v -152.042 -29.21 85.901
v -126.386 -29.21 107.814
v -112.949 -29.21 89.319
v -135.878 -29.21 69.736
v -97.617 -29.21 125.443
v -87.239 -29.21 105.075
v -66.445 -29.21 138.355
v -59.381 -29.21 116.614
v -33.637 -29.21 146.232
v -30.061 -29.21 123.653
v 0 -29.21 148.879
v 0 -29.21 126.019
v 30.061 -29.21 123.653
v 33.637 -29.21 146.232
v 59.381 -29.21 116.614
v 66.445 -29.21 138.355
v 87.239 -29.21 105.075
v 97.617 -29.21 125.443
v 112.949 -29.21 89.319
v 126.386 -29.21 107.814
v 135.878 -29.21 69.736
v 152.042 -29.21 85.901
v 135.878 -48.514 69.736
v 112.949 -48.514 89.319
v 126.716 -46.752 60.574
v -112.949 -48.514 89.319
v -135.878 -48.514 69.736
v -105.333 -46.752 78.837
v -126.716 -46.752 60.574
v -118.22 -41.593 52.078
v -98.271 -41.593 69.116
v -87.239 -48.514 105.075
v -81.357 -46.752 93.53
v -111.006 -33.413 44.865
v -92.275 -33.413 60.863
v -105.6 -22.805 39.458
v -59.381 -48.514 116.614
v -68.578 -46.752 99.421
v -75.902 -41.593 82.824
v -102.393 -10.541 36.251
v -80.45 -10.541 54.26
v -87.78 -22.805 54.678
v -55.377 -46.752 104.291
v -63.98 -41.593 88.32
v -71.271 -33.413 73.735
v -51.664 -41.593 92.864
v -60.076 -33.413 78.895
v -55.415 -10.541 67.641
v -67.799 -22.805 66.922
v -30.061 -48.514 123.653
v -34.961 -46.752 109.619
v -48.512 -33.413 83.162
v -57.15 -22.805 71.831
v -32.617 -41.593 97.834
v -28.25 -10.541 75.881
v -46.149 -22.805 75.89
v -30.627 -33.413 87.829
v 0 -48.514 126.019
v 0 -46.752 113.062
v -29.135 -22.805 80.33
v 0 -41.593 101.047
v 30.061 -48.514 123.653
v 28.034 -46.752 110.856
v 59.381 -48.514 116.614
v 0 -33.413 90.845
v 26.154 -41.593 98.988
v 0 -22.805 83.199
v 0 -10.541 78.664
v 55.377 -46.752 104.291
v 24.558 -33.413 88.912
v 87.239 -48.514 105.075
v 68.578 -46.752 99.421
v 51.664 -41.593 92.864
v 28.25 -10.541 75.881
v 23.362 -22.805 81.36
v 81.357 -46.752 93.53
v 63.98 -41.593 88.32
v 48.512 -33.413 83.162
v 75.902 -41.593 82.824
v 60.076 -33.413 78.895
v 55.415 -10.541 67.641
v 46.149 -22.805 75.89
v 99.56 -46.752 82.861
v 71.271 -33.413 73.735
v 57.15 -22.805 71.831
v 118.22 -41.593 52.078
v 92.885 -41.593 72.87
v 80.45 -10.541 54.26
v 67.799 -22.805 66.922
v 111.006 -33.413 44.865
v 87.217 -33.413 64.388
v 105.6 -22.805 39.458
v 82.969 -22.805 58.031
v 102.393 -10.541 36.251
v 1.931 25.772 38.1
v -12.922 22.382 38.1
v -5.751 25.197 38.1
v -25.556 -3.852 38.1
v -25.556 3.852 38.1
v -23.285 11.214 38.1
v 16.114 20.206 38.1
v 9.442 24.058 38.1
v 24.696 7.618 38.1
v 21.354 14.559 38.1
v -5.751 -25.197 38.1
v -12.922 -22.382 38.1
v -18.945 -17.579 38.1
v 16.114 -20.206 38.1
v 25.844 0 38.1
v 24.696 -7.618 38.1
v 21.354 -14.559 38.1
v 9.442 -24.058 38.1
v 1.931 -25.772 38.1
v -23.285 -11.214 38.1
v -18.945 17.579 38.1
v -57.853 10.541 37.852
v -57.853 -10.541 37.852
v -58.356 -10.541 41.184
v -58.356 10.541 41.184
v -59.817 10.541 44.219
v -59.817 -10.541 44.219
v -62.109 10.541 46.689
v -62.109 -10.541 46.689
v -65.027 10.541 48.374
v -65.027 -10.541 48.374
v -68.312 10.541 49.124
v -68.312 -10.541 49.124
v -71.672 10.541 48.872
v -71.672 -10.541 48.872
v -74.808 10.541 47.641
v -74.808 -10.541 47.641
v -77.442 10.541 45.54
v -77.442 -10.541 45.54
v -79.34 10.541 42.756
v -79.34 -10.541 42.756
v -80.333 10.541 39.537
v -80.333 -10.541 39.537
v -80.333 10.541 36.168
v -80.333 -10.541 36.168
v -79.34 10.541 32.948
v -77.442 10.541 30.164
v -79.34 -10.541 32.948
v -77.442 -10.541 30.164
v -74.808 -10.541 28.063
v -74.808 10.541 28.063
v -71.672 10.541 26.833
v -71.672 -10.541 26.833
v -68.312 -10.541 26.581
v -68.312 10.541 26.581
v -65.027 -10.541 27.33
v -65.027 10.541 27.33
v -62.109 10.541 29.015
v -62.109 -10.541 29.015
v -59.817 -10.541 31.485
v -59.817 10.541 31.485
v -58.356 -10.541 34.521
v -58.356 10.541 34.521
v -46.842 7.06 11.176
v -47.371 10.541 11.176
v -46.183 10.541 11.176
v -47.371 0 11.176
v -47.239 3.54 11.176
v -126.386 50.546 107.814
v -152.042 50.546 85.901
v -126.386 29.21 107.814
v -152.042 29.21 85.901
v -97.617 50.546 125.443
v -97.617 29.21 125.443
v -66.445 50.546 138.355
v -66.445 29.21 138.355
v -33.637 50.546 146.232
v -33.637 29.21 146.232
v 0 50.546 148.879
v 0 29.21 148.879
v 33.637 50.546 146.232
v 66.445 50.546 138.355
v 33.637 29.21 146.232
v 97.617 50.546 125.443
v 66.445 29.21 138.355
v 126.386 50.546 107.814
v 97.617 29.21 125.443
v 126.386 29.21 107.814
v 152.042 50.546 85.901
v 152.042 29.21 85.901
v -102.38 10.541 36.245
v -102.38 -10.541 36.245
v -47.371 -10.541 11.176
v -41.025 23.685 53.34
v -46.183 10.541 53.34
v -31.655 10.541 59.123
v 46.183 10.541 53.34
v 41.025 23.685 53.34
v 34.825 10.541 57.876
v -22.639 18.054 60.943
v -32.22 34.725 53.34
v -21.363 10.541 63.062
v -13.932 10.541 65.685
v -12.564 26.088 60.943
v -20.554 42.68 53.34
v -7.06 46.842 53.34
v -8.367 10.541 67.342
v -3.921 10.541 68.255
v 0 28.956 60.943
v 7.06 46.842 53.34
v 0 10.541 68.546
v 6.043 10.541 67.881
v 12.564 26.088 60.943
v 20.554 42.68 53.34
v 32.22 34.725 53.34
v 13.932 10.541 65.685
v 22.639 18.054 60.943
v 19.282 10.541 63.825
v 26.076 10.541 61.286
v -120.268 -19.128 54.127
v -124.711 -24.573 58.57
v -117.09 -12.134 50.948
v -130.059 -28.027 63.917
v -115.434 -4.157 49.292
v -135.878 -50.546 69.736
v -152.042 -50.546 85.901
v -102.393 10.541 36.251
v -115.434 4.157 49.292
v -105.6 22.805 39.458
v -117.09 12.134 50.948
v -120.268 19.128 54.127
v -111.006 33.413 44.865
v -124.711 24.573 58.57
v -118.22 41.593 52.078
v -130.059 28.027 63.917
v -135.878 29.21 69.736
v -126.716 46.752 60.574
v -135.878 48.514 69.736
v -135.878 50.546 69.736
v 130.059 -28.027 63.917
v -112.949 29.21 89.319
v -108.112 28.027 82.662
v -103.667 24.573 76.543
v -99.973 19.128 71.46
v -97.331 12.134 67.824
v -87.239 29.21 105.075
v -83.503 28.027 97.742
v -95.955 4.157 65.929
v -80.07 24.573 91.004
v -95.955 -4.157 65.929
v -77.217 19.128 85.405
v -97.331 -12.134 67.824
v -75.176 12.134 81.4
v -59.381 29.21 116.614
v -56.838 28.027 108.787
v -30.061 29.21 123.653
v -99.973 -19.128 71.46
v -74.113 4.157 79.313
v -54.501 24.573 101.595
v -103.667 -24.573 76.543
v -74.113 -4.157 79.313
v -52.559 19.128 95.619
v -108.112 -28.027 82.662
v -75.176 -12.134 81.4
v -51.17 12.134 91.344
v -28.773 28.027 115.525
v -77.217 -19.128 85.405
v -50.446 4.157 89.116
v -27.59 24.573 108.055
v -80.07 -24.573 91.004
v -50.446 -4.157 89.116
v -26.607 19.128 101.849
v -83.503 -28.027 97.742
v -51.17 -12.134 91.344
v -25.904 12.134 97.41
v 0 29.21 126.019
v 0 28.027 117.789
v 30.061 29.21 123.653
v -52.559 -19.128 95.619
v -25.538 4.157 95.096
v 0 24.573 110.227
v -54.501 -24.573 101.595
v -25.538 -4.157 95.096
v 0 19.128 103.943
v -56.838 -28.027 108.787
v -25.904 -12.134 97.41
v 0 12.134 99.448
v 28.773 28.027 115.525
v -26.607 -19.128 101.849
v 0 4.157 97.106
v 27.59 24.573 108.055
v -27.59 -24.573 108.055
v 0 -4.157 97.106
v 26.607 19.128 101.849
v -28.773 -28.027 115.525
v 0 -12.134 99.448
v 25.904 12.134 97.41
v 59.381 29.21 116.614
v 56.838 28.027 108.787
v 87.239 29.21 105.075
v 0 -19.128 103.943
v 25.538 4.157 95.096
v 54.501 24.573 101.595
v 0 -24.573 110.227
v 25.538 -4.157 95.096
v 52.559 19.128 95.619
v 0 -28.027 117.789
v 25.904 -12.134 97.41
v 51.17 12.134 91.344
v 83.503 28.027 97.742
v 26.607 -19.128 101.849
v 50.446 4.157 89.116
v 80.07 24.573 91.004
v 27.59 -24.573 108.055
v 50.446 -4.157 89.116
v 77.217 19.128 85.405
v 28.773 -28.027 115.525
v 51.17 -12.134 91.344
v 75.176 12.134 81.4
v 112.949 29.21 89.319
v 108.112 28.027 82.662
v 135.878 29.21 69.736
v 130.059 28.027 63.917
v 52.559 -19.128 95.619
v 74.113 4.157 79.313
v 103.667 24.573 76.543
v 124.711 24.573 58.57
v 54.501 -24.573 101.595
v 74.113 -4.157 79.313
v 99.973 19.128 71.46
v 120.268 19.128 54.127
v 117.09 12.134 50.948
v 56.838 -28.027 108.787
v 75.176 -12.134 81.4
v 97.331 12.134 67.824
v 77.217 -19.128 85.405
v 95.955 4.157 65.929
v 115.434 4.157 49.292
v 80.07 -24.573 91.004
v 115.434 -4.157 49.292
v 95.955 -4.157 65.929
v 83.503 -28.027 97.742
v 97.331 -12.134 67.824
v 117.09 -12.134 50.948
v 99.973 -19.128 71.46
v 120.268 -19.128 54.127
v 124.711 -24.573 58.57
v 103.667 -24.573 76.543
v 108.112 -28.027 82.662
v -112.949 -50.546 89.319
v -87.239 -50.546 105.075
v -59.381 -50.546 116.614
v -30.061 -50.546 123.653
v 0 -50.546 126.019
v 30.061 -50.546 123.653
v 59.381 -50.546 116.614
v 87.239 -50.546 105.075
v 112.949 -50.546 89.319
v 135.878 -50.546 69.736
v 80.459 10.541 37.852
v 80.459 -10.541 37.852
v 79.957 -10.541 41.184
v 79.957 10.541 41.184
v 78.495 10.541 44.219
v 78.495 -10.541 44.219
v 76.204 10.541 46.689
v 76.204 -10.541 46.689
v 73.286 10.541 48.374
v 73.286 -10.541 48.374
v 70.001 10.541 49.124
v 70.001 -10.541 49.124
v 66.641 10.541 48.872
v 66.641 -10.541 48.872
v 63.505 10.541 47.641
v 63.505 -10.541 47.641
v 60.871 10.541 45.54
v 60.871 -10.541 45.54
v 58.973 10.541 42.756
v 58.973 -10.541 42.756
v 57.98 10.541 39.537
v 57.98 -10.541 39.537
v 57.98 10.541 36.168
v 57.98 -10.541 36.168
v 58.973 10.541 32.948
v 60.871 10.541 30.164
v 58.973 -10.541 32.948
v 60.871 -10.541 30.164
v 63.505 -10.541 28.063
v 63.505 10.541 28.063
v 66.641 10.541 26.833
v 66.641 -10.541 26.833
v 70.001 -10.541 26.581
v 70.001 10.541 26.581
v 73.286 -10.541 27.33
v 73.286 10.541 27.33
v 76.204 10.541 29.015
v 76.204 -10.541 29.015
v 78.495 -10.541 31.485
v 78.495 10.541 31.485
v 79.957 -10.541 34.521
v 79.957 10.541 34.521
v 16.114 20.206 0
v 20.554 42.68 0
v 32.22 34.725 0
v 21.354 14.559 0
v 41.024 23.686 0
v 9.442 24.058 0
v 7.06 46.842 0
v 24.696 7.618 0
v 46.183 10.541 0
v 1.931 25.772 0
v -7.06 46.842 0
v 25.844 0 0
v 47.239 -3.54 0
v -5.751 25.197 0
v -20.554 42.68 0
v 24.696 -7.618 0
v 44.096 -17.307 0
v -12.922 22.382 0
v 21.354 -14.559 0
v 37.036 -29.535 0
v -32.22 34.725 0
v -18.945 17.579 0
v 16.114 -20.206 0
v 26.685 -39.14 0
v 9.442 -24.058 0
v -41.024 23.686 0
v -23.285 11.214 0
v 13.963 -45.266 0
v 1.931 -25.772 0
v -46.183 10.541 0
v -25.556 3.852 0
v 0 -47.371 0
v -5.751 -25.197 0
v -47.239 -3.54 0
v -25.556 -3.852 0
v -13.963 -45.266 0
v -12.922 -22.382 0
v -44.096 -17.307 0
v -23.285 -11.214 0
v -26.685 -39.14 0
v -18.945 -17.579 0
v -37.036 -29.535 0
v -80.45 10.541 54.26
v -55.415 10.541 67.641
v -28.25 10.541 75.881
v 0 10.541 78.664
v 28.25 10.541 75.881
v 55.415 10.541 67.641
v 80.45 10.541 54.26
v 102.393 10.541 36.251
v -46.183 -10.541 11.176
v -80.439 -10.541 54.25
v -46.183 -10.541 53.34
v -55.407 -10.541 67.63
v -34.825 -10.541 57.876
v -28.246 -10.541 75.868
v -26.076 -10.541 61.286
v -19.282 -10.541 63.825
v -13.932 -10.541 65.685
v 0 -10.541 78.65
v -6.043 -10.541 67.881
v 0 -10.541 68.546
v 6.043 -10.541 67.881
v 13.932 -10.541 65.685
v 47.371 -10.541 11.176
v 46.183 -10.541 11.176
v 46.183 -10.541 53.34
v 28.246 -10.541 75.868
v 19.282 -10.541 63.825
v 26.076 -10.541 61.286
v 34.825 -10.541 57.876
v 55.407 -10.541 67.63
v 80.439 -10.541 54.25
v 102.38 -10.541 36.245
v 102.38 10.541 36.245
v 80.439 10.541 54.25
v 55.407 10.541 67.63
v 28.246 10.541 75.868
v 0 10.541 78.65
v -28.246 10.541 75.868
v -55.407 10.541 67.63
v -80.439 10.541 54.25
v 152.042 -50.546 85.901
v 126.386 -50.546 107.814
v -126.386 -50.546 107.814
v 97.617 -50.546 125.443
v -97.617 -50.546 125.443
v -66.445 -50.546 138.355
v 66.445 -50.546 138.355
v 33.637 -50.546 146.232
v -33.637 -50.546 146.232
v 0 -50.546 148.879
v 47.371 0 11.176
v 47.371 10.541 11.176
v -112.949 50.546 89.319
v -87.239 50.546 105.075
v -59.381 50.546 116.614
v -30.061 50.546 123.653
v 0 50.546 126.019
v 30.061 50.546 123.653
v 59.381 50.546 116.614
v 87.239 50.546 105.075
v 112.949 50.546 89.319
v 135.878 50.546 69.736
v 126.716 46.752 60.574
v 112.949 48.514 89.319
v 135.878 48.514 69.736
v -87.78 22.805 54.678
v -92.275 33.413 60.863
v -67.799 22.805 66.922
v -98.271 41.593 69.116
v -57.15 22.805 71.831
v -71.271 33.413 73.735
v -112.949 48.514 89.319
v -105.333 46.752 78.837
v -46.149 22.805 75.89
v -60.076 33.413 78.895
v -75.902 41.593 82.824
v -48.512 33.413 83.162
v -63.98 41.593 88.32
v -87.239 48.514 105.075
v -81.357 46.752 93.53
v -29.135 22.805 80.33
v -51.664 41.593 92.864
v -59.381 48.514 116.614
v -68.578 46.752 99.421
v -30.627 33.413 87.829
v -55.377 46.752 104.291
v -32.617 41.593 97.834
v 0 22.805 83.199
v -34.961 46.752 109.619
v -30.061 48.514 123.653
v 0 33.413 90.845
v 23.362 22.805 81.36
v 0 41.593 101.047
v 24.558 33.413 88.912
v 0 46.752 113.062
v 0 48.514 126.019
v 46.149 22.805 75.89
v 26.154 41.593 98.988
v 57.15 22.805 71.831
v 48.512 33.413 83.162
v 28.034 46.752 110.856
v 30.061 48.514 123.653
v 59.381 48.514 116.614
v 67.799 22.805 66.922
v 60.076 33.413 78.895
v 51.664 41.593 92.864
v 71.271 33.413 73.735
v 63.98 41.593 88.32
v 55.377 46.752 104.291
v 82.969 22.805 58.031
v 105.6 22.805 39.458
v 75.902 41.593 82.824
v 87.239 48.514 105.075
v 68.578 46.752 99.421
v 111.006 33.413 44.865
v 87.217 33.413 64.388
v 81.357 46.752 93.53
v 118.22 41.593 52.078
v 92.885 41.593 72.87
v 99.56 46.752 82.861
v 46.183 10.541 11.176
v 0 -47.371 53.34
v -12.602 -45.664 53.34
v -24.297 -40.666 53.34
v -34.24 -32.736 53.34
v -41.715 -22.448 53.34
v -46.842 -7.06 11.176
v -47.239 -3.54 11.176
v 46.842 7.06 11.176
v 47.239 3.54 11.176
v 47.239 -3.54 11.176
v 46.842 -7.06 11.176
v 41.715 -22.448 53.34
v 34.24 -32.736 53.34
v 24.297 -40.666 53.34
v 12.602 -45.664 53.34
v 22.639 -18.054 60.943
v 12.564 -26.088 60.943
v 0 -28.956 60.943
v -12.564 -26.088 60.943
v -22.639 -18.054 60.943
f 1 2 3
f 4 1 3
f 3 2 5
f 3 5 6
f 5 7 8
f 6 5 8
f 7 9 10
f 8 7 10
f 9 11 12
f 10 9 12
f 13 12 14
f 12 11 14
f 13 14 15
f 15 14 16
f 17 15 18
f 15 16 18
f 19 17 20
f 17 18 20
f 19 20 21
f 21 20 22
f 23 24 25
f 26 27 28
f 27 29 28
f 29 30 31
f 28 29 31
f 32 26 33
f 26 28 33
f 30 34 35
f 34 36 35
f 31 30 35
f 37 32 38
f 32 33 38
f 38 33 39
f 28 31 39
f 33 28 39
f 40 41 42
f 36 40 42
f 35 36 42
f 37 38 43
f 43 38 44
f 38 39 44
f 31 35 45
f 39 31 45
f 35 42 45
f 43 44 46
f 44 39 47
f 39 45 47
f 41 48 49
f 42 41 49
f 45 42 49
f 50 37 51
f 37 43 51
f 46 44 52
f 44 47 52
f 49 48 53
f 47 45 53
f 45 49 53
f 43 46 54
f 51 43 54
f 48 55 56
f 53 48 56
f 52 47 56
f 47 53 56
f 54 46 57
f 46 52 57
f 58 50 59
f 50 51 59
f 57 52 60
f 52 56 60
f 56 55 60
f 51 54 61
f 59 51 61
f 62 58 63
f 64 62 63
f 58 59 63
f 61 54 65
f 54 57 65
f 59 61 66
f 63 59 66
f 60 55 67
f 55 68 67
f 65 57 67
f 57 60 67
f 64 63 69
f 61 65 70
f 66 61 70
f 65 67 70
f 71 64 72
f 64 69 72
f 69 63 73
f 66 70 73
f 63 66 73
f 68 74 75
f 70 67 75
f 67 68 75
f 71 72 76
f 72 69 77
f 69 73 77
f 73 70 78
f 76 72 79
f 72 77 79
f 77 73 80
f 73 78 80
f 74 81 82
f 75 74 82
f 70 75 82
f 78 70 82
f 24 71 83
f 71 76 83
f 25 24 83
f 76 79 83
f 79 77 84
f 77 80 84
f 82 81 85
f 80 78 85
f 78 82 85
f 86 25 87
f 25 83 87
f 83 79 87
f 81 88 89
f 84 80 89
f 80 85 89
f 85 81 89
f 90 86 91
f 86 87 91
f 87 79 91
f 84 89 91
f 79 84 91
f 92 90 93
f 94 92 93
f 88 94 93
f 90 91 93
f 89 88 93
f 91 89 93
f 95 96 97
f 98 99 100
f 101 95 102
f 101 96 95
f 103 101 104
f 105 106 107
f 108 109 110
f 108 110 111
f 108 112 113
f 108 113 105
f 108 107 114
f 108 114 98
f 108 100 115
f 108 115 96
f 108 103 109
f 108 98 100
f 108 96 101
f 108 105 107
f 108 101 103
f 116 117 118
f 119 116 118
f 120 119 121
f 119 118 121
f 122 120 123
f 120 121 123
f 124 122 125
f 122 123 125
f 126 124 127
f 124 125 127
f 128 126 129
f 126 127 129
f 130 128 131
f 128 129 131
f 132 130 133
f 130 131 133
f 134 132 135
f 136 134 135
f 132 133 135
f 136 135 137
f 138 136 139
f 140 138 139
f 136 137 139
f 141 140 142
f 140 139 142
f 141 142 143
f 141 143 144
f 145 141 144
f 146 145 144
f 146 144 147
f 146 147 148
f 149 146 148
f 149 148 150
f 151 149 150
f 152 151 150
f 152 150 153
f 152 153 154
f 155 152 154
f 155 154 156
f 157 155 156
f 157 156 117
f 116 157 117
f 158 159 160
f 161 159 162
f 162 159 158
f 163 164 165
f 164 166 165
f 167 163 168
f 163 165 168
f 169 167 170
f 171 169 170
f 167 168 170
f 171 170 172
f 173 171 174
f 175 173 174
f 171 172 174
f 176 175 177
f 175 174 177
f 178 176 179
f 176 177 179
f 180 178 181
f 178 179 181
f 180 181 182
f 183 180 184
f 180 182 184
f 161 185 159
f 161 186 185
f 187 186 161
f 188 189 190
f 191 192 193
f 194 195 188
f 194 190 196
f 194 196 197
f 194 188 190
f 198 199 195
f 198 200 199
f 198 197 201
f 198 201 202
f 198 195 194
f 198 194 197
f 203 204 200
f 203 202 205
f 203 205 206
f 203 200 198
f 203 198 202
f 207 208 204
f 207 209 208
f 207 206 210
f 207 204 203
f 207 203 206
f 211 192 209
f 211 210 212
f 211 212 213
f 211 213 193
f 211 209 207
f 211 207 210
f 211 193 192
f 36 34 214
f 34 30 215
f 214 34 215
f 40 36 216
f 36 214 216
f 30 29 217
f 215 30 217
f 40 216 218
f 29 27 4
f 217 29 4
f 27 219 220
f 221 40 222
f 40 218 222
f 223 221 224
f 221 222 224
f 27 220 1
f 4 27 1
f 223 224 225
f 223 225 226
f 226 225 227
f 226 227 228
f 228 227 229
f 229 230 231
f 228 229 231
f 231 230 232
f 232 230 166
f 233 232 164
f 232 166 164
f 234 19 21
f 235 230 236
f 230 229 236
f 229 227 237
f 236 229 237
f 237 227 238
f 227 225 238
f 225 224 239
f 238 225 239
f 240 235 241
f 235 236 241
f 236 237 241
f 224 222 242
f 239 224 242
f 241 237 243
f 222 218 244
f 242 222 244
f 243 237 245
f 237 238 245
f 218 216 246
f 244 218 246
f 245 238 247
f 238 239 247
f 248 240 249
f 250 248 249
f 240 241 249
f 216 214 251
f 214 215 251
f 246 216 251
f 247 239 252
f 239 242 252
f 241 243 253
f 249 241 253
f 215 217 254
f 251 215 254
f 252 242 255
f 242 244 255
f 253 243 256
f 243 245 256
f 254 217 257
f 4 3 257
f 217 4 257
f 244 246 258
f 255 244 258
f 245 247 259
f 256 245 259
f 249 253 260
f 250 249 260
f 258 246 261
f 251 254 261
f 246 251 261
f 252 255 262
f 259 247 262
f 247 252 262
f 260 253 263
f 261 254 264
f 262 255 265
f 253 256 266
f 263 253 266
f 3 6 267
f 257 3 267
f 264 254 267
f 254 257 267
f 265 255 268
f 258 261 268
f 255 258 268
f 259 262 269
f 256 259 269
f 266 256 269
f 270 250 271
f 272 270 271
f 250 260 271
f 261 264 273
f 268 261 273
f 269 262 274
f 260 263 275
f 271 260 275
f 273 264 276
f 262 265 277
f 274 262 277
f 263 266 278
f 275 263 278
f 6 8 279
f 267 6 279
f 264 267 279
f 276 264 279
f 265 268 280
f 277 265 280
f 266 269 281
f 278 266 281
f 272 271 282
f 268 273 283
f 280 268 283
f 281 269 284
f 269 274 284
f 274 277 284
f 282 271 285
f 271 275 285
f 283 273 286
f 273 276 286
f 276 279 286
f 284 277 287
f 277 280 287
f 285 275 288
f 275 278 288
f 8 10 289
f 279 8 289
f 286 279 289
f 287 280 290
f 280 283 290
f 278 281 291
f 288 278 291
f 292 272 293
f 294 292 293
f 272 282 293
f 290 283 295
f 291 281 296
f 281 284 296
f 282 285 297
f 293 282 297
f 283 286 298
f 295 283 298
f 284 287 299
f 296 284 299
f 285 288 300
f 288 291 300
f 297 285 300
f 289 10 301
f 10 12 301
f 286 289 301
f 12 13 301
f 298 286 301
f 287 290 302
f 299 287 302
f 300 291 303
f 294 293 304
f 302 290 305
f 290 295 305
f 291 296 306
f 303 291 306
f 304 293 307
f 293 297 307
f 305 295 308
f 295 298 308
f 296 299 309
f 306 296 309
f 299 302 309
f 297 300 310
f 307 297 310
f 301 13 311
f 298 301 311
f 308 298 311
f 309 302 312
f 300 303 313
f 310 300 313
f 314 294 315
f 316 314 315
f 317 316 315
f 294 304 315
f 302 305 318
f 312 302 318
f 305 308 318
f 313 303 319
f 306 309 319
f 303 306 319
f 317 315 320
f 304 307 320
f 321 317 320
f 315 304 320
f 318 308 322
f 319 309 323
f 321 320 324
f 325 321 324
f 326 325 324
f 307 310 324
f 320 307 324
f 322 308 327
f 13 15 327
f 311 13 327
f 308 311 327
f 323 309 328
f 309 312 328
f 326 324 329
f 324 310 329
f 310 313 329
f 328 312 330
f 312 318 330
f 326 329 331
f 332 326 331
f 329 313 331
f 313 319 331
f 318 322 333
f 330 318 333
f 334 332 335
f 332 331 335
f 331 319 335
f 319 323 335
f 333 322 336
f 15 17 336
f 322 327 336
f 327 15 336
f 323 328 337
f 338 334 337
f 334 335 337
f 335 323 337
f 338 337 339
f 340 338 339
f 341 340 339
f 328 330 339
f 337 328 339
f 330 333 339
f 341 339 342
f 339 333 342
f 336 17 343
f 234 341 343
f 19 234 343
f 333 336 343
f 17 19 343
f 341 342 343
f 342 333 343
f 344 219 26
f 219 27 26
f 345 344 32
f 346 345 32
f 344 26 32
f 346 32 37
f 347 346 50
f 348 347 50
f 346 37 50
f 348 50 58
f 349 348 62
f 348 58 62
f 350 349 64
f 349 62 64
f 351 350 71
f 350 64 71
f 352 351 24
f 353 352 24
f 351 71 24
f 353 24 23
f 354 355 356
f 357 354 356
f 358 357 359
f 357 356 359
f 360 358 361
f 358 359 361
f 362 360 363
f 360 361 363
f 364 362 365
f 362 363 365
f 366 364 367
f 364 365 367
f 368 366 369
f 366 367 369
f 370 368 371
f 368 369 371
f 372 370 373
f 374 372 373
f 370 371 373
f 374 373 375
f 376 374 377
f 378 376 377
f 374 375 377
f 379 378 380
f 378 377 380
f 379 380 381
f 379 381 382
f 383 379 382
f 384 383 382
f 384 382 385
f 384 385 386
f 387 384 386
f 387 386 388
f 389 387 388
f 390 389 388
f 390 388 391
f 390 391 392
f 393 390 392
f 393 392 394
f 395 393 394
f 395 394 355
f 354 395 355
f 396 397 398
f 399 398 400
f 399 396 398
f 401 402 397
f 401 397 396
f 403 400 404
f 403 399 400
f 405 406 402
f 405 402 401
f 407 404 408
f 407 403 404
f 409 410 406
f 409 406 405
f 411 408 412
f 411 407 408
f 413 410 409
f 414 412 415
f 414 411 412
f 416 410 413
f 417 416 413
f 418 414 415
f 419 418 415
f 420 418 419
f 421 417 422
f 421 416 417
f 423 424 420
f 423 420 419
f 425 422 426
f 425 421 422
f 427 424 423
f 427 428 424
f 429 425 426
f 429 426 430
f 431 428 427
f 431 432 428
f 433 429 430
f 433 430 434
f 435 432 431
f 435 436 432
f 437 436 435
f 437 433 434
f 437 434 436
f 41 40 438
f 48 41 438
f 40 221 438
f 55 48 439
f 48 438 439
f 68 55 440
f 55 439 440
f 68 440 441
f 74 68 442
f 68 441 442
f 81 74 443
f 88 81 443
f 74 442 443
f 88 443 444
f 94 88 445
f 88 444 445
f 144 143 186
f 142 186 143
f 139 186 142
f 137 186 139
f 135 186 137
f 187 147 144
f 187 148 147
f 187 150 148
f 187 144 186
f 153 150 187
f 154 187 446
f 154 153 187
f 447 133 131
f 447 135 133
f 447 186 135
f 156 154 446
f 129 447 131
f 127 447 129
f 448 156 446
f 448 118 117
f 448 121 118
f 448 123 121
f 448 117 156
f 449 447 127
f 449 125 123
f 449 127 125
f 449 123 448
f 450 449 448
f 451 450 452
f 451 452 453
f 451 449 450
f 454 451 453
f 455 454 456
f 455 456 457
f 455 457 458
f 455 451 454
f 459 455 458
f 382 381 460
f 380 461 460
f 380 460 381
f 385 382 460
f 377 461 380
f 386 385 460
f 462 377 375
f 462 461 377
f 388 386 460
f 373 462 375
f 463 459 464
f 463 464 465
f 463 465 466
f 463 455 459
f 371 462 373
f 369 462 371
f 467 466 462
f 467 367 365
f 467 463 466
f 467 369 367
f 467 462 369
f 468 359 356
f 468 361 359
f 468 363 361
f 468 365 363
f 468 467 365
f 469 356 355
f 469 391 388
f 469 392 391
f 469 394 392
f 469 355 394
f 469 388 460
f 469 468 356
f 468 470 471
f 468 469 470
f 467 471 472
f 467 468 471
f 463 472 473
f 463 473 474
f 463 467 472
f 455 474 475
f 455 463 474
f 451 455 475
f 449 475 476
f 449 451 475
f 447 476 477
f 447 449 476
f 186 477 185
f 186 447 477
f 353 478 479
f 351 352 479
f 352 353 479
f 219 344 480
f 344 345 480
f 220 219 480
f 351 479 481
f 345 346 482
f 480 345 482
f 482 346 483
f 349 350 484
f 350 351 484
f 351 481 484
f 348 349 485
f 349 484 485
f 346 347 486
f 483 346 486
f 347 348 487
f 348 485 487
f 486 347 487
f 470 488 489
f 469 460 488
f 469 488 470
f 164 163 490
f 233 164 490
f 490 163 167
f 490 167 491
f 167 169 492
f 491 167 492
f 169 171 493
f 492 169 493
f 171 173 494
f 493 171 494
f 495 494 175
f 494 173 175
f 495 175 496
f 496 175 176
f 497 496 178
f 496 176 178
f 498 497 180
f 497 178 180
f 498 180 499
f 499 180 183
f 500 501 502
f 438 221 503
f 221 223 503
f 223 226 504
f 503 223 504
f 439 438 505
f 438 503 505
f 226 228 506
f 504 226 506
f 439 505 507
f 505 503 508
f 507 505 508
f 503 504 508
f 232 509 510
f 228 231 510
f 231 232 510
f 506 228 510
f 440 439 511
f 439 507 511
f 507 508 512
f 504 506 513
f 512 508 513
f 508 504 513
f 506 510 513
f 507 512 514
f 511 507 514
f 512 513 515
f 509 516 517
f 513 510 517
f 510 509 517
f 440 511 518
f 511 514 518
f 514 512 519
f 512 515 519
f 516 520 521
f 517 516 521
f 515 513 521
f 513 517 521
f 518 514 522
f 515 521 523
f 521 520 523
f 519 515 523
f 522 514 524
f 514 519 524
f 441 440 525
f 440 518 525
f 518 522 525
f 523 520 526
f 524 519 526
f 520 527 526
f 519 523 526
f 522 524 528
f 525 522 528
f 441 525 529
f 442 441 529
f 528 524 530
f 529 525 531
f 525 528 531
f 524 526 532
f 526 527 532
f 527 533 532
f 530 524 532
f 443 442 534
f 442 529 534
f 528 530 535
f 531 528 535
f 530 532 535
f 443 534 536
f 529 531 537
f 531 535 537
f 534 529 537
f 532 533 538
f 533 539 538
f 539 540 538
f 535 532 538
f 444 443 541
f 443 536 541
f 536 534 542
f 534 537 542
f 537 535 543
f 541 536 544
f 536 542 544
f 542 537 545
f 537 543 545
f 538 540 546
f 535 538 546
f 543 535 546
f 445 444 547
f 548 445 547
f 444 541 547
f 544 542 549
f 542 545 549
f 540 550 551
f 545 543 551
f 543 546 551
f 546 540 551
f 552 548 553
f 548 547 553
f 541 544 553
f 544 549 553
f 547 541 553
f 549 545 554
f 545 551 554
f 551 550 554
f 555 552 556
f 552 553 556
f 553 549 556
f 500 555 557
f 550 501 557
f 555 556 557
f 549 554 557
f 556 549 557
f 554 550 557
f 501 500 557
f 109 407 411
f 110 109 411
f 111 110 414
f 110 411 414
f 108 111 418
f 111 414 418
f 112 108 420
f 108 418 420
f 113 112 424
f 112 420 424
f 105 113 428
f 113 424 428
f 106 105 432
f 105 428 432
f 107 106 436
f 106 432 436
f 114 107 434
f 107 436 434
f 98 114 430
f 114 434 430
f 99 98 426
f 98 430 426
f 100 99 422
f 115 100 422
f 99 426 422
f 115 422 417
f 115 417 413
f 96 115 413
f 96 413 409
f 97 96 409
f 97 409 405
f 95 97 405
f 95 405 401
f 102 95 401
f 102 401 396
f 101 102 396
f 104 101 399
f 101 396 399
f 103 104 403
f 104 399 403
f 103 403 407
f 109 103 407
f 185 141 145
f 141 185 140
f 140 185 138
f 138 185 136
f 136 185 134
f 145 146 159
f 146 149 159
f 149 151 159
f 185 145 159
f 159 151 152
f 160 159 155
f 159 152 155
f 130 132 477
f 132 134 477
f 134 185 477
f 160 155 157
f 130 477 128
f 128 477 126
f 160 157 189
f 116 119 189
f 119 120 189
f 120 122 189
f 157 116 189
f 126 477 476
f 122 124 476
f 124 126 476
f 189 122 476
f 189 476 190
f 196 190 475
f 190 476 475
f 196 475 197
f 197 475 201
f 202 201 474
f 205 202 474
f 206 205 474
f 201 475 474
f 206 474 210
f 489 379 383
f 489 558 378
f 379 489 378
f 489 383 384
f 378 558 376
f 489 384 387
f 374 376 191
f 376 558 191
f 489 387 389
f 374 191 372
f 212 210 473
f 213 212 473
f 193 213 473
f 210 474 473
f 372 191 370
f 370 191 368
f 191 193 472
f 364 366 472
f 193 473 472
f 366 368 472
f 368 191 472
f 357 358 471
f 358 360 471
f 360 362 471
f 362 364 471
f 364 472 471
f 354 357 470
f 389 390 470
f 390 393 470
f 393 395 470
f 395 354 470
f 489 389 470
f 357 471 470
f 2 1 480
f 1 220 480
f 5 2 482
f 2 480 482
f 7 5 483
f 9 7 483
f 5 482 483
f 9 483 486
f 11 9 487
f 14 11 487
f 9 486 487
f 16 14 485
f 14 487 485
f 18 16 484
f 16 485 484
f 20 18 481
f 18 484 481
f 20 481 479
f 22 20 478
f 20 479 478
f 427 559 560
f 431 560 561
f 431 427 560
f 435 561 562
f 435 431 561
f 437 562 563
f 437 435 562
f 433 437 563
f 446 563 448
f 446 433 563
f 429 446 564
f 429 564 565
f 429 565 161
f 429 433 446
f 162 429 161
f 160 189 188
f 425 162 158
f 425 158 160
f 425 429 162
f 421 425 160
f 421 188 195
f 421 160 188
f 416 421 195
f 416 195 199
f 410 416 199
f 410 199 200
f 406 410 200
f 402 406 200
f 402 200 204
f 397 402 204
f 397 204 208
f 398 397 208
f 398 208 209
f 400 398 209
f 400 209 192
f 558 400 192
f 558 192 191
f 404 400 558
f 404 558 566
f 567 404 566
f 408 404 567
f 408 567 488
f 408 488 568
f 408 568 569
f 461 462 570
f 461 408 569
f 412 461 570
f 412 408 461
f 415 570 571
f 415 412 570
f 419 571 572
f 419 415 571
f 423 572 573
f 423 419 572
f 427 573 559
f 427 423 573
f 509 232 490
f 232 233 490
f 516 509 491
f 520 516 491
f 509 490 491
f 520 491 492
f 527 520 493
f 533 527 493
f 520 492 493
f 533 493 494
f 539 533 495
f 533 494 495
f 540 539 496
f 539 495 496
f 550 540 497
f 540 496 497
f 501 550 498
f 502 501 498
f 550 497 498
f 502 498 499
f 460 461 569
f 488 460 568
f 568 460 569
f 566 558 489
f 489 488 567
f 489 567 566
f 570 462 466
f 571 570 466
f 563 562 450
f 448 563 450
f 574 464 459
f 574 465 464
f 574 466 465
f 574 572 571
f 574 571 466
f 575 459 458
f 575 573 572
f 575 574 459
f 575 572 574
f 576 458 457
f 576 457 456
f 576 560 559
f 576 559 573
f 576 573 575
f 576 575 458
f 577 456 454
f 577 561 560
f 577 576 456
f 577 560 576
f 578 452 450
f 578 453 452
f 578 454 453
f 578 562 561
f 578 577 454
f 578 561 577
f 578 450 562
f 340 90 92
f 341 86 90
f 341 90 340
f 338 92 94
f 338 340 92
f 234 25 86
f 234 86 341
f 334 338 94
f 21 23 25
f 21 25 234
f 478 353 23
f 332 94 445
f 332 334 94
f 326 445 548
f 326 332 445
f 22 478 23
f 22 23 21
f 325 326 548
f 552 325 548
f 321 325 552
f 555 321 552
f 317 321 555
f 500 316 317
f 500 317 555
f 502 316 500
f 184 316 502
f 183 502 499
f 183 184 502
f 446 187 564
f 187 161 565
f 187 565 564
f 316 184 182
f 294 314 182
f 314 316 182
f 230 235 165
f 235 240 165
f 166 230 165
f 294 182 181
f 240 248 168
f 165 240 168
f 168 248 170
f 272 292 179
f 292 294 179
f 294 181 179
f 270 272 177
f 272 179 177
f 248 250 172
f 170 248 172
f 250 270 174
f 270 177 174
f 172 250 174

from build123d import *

# Parameters (mm, degrees)
F1_DEPTH      = 10.541
F3_ANGLE_BACK = 45
F3_ANGLE      = 90
F6_R          = 11.303
F7_DEPTH      = 25.4
F8_R          = 25.8445
F9_DEPTH      = 38.1


# Not quite as in the source:
# - a feature names something its author has since deleted; it is built from what else it names


with BuildPart() as f1:
    # F0 (on Front) → F1 (new body, symmetric)
    with BuildSketch(Plane.XZ):
        with BuildLine():
            Line((-102.379978747, 36.2450359051), (-47.371, 11.176))
            Line((-47.371, 11.176), (47.371, 11.176))
            Line((47.371, 11.176), (102.379978747, 36.2450359051))
            ThreePointArc((102.379978747, 36.2450359051), (0, 78.6502618576), (-102.379978747, 36.2450359051))
        make_face()
    extrude(amount=F1_DEPTH, both=True)

    # F4 (on Right) → F5 (revolve)
    with BuildSketch(Plane.YZ):
        Polygon((-47.371, 0), (0, 0), (0, 72.898), (-47.371, 53.34), align=None)
    revolve(axis=Axis((0, 0, 36.449), (0, 0, -1)))

    # F6 (on face) → F7 (cut)
    with BuildSketch(Plane.XZ.offset(10.541)):
        with Locations((-69.1564316947, 37.8521587433)):
            Circle(F6_R)
        with Locations((69.1564316947, 37.8521587433)):
            Circle(F6_R)
    extrude(amount=-F7_DEPTH, mode=Mode.SUBTRACT)

    # F8 (on face) → F9 (cut)
    with BuildSketch(Plane(origin=(0, 0, 0), x_dir=(1, 0, 0), z_dir=(0, 0, -1))):
        Circle(F8_R)
    extrude(amount=-F9_DEPTH, mode=Mode.SUBTRACT)


with BuildPart() as f3:
    # F2 (on Right) → F3 (revolve)
    with BuildSketch(Plane.YZ, mode=Mode.PRIVATE) as f3_sk:
        with BuildLine():
            ThreePointArc((-48.514, 126.0187946151), (-37.8483438872, 95.6689830671), (-10.541, 78.6638))
            Line((-10.541, 78.6638), (10.541, 78.6638))
            ThreePointArc((10.541, 78.6638), (37.8483438872, 95.6689830671), (48.514, 126.0187946151))
            Line((48.514, 126.0187946151), (50.546, 126.0187946151))
            Line((50.546, 126.0187946151), (50.546, 148.8787946151))
            Line((50.546, 148.8787946151), (29.21, 148.8787946151))
            Line((29.21, 148.8787946151), (29.21, 126.0187946151))
            ThreePointArc((29.21, 126.0187946151), (0, 96.8087946151), (-29.21, 126.0187946151))
            Line((-29.21, 126.0187946151), (-29.21, 148.8787946151))
            Line((-29.21, 148.8787946151), (-50.546, 148.8787946151))
            Line((-50.546, 148.8787946151), (-50.546, 126.0187946151))
            Line((-50.546, 126.0187946151), (-48.514, 126.0187946151))
        make_face()
    revolve(f3_sk.sketch.rotate(Axis((0, 7.0290416479, -66.1416), (0, 1, 0)), -F3_ANGLE_BACK), axis=Axis((0, 7.0290416479, -66.1416), (0, 1, 0)), revolution_arc=F3_ANGLE)


solid = Compound([f1.part, f3.part])
